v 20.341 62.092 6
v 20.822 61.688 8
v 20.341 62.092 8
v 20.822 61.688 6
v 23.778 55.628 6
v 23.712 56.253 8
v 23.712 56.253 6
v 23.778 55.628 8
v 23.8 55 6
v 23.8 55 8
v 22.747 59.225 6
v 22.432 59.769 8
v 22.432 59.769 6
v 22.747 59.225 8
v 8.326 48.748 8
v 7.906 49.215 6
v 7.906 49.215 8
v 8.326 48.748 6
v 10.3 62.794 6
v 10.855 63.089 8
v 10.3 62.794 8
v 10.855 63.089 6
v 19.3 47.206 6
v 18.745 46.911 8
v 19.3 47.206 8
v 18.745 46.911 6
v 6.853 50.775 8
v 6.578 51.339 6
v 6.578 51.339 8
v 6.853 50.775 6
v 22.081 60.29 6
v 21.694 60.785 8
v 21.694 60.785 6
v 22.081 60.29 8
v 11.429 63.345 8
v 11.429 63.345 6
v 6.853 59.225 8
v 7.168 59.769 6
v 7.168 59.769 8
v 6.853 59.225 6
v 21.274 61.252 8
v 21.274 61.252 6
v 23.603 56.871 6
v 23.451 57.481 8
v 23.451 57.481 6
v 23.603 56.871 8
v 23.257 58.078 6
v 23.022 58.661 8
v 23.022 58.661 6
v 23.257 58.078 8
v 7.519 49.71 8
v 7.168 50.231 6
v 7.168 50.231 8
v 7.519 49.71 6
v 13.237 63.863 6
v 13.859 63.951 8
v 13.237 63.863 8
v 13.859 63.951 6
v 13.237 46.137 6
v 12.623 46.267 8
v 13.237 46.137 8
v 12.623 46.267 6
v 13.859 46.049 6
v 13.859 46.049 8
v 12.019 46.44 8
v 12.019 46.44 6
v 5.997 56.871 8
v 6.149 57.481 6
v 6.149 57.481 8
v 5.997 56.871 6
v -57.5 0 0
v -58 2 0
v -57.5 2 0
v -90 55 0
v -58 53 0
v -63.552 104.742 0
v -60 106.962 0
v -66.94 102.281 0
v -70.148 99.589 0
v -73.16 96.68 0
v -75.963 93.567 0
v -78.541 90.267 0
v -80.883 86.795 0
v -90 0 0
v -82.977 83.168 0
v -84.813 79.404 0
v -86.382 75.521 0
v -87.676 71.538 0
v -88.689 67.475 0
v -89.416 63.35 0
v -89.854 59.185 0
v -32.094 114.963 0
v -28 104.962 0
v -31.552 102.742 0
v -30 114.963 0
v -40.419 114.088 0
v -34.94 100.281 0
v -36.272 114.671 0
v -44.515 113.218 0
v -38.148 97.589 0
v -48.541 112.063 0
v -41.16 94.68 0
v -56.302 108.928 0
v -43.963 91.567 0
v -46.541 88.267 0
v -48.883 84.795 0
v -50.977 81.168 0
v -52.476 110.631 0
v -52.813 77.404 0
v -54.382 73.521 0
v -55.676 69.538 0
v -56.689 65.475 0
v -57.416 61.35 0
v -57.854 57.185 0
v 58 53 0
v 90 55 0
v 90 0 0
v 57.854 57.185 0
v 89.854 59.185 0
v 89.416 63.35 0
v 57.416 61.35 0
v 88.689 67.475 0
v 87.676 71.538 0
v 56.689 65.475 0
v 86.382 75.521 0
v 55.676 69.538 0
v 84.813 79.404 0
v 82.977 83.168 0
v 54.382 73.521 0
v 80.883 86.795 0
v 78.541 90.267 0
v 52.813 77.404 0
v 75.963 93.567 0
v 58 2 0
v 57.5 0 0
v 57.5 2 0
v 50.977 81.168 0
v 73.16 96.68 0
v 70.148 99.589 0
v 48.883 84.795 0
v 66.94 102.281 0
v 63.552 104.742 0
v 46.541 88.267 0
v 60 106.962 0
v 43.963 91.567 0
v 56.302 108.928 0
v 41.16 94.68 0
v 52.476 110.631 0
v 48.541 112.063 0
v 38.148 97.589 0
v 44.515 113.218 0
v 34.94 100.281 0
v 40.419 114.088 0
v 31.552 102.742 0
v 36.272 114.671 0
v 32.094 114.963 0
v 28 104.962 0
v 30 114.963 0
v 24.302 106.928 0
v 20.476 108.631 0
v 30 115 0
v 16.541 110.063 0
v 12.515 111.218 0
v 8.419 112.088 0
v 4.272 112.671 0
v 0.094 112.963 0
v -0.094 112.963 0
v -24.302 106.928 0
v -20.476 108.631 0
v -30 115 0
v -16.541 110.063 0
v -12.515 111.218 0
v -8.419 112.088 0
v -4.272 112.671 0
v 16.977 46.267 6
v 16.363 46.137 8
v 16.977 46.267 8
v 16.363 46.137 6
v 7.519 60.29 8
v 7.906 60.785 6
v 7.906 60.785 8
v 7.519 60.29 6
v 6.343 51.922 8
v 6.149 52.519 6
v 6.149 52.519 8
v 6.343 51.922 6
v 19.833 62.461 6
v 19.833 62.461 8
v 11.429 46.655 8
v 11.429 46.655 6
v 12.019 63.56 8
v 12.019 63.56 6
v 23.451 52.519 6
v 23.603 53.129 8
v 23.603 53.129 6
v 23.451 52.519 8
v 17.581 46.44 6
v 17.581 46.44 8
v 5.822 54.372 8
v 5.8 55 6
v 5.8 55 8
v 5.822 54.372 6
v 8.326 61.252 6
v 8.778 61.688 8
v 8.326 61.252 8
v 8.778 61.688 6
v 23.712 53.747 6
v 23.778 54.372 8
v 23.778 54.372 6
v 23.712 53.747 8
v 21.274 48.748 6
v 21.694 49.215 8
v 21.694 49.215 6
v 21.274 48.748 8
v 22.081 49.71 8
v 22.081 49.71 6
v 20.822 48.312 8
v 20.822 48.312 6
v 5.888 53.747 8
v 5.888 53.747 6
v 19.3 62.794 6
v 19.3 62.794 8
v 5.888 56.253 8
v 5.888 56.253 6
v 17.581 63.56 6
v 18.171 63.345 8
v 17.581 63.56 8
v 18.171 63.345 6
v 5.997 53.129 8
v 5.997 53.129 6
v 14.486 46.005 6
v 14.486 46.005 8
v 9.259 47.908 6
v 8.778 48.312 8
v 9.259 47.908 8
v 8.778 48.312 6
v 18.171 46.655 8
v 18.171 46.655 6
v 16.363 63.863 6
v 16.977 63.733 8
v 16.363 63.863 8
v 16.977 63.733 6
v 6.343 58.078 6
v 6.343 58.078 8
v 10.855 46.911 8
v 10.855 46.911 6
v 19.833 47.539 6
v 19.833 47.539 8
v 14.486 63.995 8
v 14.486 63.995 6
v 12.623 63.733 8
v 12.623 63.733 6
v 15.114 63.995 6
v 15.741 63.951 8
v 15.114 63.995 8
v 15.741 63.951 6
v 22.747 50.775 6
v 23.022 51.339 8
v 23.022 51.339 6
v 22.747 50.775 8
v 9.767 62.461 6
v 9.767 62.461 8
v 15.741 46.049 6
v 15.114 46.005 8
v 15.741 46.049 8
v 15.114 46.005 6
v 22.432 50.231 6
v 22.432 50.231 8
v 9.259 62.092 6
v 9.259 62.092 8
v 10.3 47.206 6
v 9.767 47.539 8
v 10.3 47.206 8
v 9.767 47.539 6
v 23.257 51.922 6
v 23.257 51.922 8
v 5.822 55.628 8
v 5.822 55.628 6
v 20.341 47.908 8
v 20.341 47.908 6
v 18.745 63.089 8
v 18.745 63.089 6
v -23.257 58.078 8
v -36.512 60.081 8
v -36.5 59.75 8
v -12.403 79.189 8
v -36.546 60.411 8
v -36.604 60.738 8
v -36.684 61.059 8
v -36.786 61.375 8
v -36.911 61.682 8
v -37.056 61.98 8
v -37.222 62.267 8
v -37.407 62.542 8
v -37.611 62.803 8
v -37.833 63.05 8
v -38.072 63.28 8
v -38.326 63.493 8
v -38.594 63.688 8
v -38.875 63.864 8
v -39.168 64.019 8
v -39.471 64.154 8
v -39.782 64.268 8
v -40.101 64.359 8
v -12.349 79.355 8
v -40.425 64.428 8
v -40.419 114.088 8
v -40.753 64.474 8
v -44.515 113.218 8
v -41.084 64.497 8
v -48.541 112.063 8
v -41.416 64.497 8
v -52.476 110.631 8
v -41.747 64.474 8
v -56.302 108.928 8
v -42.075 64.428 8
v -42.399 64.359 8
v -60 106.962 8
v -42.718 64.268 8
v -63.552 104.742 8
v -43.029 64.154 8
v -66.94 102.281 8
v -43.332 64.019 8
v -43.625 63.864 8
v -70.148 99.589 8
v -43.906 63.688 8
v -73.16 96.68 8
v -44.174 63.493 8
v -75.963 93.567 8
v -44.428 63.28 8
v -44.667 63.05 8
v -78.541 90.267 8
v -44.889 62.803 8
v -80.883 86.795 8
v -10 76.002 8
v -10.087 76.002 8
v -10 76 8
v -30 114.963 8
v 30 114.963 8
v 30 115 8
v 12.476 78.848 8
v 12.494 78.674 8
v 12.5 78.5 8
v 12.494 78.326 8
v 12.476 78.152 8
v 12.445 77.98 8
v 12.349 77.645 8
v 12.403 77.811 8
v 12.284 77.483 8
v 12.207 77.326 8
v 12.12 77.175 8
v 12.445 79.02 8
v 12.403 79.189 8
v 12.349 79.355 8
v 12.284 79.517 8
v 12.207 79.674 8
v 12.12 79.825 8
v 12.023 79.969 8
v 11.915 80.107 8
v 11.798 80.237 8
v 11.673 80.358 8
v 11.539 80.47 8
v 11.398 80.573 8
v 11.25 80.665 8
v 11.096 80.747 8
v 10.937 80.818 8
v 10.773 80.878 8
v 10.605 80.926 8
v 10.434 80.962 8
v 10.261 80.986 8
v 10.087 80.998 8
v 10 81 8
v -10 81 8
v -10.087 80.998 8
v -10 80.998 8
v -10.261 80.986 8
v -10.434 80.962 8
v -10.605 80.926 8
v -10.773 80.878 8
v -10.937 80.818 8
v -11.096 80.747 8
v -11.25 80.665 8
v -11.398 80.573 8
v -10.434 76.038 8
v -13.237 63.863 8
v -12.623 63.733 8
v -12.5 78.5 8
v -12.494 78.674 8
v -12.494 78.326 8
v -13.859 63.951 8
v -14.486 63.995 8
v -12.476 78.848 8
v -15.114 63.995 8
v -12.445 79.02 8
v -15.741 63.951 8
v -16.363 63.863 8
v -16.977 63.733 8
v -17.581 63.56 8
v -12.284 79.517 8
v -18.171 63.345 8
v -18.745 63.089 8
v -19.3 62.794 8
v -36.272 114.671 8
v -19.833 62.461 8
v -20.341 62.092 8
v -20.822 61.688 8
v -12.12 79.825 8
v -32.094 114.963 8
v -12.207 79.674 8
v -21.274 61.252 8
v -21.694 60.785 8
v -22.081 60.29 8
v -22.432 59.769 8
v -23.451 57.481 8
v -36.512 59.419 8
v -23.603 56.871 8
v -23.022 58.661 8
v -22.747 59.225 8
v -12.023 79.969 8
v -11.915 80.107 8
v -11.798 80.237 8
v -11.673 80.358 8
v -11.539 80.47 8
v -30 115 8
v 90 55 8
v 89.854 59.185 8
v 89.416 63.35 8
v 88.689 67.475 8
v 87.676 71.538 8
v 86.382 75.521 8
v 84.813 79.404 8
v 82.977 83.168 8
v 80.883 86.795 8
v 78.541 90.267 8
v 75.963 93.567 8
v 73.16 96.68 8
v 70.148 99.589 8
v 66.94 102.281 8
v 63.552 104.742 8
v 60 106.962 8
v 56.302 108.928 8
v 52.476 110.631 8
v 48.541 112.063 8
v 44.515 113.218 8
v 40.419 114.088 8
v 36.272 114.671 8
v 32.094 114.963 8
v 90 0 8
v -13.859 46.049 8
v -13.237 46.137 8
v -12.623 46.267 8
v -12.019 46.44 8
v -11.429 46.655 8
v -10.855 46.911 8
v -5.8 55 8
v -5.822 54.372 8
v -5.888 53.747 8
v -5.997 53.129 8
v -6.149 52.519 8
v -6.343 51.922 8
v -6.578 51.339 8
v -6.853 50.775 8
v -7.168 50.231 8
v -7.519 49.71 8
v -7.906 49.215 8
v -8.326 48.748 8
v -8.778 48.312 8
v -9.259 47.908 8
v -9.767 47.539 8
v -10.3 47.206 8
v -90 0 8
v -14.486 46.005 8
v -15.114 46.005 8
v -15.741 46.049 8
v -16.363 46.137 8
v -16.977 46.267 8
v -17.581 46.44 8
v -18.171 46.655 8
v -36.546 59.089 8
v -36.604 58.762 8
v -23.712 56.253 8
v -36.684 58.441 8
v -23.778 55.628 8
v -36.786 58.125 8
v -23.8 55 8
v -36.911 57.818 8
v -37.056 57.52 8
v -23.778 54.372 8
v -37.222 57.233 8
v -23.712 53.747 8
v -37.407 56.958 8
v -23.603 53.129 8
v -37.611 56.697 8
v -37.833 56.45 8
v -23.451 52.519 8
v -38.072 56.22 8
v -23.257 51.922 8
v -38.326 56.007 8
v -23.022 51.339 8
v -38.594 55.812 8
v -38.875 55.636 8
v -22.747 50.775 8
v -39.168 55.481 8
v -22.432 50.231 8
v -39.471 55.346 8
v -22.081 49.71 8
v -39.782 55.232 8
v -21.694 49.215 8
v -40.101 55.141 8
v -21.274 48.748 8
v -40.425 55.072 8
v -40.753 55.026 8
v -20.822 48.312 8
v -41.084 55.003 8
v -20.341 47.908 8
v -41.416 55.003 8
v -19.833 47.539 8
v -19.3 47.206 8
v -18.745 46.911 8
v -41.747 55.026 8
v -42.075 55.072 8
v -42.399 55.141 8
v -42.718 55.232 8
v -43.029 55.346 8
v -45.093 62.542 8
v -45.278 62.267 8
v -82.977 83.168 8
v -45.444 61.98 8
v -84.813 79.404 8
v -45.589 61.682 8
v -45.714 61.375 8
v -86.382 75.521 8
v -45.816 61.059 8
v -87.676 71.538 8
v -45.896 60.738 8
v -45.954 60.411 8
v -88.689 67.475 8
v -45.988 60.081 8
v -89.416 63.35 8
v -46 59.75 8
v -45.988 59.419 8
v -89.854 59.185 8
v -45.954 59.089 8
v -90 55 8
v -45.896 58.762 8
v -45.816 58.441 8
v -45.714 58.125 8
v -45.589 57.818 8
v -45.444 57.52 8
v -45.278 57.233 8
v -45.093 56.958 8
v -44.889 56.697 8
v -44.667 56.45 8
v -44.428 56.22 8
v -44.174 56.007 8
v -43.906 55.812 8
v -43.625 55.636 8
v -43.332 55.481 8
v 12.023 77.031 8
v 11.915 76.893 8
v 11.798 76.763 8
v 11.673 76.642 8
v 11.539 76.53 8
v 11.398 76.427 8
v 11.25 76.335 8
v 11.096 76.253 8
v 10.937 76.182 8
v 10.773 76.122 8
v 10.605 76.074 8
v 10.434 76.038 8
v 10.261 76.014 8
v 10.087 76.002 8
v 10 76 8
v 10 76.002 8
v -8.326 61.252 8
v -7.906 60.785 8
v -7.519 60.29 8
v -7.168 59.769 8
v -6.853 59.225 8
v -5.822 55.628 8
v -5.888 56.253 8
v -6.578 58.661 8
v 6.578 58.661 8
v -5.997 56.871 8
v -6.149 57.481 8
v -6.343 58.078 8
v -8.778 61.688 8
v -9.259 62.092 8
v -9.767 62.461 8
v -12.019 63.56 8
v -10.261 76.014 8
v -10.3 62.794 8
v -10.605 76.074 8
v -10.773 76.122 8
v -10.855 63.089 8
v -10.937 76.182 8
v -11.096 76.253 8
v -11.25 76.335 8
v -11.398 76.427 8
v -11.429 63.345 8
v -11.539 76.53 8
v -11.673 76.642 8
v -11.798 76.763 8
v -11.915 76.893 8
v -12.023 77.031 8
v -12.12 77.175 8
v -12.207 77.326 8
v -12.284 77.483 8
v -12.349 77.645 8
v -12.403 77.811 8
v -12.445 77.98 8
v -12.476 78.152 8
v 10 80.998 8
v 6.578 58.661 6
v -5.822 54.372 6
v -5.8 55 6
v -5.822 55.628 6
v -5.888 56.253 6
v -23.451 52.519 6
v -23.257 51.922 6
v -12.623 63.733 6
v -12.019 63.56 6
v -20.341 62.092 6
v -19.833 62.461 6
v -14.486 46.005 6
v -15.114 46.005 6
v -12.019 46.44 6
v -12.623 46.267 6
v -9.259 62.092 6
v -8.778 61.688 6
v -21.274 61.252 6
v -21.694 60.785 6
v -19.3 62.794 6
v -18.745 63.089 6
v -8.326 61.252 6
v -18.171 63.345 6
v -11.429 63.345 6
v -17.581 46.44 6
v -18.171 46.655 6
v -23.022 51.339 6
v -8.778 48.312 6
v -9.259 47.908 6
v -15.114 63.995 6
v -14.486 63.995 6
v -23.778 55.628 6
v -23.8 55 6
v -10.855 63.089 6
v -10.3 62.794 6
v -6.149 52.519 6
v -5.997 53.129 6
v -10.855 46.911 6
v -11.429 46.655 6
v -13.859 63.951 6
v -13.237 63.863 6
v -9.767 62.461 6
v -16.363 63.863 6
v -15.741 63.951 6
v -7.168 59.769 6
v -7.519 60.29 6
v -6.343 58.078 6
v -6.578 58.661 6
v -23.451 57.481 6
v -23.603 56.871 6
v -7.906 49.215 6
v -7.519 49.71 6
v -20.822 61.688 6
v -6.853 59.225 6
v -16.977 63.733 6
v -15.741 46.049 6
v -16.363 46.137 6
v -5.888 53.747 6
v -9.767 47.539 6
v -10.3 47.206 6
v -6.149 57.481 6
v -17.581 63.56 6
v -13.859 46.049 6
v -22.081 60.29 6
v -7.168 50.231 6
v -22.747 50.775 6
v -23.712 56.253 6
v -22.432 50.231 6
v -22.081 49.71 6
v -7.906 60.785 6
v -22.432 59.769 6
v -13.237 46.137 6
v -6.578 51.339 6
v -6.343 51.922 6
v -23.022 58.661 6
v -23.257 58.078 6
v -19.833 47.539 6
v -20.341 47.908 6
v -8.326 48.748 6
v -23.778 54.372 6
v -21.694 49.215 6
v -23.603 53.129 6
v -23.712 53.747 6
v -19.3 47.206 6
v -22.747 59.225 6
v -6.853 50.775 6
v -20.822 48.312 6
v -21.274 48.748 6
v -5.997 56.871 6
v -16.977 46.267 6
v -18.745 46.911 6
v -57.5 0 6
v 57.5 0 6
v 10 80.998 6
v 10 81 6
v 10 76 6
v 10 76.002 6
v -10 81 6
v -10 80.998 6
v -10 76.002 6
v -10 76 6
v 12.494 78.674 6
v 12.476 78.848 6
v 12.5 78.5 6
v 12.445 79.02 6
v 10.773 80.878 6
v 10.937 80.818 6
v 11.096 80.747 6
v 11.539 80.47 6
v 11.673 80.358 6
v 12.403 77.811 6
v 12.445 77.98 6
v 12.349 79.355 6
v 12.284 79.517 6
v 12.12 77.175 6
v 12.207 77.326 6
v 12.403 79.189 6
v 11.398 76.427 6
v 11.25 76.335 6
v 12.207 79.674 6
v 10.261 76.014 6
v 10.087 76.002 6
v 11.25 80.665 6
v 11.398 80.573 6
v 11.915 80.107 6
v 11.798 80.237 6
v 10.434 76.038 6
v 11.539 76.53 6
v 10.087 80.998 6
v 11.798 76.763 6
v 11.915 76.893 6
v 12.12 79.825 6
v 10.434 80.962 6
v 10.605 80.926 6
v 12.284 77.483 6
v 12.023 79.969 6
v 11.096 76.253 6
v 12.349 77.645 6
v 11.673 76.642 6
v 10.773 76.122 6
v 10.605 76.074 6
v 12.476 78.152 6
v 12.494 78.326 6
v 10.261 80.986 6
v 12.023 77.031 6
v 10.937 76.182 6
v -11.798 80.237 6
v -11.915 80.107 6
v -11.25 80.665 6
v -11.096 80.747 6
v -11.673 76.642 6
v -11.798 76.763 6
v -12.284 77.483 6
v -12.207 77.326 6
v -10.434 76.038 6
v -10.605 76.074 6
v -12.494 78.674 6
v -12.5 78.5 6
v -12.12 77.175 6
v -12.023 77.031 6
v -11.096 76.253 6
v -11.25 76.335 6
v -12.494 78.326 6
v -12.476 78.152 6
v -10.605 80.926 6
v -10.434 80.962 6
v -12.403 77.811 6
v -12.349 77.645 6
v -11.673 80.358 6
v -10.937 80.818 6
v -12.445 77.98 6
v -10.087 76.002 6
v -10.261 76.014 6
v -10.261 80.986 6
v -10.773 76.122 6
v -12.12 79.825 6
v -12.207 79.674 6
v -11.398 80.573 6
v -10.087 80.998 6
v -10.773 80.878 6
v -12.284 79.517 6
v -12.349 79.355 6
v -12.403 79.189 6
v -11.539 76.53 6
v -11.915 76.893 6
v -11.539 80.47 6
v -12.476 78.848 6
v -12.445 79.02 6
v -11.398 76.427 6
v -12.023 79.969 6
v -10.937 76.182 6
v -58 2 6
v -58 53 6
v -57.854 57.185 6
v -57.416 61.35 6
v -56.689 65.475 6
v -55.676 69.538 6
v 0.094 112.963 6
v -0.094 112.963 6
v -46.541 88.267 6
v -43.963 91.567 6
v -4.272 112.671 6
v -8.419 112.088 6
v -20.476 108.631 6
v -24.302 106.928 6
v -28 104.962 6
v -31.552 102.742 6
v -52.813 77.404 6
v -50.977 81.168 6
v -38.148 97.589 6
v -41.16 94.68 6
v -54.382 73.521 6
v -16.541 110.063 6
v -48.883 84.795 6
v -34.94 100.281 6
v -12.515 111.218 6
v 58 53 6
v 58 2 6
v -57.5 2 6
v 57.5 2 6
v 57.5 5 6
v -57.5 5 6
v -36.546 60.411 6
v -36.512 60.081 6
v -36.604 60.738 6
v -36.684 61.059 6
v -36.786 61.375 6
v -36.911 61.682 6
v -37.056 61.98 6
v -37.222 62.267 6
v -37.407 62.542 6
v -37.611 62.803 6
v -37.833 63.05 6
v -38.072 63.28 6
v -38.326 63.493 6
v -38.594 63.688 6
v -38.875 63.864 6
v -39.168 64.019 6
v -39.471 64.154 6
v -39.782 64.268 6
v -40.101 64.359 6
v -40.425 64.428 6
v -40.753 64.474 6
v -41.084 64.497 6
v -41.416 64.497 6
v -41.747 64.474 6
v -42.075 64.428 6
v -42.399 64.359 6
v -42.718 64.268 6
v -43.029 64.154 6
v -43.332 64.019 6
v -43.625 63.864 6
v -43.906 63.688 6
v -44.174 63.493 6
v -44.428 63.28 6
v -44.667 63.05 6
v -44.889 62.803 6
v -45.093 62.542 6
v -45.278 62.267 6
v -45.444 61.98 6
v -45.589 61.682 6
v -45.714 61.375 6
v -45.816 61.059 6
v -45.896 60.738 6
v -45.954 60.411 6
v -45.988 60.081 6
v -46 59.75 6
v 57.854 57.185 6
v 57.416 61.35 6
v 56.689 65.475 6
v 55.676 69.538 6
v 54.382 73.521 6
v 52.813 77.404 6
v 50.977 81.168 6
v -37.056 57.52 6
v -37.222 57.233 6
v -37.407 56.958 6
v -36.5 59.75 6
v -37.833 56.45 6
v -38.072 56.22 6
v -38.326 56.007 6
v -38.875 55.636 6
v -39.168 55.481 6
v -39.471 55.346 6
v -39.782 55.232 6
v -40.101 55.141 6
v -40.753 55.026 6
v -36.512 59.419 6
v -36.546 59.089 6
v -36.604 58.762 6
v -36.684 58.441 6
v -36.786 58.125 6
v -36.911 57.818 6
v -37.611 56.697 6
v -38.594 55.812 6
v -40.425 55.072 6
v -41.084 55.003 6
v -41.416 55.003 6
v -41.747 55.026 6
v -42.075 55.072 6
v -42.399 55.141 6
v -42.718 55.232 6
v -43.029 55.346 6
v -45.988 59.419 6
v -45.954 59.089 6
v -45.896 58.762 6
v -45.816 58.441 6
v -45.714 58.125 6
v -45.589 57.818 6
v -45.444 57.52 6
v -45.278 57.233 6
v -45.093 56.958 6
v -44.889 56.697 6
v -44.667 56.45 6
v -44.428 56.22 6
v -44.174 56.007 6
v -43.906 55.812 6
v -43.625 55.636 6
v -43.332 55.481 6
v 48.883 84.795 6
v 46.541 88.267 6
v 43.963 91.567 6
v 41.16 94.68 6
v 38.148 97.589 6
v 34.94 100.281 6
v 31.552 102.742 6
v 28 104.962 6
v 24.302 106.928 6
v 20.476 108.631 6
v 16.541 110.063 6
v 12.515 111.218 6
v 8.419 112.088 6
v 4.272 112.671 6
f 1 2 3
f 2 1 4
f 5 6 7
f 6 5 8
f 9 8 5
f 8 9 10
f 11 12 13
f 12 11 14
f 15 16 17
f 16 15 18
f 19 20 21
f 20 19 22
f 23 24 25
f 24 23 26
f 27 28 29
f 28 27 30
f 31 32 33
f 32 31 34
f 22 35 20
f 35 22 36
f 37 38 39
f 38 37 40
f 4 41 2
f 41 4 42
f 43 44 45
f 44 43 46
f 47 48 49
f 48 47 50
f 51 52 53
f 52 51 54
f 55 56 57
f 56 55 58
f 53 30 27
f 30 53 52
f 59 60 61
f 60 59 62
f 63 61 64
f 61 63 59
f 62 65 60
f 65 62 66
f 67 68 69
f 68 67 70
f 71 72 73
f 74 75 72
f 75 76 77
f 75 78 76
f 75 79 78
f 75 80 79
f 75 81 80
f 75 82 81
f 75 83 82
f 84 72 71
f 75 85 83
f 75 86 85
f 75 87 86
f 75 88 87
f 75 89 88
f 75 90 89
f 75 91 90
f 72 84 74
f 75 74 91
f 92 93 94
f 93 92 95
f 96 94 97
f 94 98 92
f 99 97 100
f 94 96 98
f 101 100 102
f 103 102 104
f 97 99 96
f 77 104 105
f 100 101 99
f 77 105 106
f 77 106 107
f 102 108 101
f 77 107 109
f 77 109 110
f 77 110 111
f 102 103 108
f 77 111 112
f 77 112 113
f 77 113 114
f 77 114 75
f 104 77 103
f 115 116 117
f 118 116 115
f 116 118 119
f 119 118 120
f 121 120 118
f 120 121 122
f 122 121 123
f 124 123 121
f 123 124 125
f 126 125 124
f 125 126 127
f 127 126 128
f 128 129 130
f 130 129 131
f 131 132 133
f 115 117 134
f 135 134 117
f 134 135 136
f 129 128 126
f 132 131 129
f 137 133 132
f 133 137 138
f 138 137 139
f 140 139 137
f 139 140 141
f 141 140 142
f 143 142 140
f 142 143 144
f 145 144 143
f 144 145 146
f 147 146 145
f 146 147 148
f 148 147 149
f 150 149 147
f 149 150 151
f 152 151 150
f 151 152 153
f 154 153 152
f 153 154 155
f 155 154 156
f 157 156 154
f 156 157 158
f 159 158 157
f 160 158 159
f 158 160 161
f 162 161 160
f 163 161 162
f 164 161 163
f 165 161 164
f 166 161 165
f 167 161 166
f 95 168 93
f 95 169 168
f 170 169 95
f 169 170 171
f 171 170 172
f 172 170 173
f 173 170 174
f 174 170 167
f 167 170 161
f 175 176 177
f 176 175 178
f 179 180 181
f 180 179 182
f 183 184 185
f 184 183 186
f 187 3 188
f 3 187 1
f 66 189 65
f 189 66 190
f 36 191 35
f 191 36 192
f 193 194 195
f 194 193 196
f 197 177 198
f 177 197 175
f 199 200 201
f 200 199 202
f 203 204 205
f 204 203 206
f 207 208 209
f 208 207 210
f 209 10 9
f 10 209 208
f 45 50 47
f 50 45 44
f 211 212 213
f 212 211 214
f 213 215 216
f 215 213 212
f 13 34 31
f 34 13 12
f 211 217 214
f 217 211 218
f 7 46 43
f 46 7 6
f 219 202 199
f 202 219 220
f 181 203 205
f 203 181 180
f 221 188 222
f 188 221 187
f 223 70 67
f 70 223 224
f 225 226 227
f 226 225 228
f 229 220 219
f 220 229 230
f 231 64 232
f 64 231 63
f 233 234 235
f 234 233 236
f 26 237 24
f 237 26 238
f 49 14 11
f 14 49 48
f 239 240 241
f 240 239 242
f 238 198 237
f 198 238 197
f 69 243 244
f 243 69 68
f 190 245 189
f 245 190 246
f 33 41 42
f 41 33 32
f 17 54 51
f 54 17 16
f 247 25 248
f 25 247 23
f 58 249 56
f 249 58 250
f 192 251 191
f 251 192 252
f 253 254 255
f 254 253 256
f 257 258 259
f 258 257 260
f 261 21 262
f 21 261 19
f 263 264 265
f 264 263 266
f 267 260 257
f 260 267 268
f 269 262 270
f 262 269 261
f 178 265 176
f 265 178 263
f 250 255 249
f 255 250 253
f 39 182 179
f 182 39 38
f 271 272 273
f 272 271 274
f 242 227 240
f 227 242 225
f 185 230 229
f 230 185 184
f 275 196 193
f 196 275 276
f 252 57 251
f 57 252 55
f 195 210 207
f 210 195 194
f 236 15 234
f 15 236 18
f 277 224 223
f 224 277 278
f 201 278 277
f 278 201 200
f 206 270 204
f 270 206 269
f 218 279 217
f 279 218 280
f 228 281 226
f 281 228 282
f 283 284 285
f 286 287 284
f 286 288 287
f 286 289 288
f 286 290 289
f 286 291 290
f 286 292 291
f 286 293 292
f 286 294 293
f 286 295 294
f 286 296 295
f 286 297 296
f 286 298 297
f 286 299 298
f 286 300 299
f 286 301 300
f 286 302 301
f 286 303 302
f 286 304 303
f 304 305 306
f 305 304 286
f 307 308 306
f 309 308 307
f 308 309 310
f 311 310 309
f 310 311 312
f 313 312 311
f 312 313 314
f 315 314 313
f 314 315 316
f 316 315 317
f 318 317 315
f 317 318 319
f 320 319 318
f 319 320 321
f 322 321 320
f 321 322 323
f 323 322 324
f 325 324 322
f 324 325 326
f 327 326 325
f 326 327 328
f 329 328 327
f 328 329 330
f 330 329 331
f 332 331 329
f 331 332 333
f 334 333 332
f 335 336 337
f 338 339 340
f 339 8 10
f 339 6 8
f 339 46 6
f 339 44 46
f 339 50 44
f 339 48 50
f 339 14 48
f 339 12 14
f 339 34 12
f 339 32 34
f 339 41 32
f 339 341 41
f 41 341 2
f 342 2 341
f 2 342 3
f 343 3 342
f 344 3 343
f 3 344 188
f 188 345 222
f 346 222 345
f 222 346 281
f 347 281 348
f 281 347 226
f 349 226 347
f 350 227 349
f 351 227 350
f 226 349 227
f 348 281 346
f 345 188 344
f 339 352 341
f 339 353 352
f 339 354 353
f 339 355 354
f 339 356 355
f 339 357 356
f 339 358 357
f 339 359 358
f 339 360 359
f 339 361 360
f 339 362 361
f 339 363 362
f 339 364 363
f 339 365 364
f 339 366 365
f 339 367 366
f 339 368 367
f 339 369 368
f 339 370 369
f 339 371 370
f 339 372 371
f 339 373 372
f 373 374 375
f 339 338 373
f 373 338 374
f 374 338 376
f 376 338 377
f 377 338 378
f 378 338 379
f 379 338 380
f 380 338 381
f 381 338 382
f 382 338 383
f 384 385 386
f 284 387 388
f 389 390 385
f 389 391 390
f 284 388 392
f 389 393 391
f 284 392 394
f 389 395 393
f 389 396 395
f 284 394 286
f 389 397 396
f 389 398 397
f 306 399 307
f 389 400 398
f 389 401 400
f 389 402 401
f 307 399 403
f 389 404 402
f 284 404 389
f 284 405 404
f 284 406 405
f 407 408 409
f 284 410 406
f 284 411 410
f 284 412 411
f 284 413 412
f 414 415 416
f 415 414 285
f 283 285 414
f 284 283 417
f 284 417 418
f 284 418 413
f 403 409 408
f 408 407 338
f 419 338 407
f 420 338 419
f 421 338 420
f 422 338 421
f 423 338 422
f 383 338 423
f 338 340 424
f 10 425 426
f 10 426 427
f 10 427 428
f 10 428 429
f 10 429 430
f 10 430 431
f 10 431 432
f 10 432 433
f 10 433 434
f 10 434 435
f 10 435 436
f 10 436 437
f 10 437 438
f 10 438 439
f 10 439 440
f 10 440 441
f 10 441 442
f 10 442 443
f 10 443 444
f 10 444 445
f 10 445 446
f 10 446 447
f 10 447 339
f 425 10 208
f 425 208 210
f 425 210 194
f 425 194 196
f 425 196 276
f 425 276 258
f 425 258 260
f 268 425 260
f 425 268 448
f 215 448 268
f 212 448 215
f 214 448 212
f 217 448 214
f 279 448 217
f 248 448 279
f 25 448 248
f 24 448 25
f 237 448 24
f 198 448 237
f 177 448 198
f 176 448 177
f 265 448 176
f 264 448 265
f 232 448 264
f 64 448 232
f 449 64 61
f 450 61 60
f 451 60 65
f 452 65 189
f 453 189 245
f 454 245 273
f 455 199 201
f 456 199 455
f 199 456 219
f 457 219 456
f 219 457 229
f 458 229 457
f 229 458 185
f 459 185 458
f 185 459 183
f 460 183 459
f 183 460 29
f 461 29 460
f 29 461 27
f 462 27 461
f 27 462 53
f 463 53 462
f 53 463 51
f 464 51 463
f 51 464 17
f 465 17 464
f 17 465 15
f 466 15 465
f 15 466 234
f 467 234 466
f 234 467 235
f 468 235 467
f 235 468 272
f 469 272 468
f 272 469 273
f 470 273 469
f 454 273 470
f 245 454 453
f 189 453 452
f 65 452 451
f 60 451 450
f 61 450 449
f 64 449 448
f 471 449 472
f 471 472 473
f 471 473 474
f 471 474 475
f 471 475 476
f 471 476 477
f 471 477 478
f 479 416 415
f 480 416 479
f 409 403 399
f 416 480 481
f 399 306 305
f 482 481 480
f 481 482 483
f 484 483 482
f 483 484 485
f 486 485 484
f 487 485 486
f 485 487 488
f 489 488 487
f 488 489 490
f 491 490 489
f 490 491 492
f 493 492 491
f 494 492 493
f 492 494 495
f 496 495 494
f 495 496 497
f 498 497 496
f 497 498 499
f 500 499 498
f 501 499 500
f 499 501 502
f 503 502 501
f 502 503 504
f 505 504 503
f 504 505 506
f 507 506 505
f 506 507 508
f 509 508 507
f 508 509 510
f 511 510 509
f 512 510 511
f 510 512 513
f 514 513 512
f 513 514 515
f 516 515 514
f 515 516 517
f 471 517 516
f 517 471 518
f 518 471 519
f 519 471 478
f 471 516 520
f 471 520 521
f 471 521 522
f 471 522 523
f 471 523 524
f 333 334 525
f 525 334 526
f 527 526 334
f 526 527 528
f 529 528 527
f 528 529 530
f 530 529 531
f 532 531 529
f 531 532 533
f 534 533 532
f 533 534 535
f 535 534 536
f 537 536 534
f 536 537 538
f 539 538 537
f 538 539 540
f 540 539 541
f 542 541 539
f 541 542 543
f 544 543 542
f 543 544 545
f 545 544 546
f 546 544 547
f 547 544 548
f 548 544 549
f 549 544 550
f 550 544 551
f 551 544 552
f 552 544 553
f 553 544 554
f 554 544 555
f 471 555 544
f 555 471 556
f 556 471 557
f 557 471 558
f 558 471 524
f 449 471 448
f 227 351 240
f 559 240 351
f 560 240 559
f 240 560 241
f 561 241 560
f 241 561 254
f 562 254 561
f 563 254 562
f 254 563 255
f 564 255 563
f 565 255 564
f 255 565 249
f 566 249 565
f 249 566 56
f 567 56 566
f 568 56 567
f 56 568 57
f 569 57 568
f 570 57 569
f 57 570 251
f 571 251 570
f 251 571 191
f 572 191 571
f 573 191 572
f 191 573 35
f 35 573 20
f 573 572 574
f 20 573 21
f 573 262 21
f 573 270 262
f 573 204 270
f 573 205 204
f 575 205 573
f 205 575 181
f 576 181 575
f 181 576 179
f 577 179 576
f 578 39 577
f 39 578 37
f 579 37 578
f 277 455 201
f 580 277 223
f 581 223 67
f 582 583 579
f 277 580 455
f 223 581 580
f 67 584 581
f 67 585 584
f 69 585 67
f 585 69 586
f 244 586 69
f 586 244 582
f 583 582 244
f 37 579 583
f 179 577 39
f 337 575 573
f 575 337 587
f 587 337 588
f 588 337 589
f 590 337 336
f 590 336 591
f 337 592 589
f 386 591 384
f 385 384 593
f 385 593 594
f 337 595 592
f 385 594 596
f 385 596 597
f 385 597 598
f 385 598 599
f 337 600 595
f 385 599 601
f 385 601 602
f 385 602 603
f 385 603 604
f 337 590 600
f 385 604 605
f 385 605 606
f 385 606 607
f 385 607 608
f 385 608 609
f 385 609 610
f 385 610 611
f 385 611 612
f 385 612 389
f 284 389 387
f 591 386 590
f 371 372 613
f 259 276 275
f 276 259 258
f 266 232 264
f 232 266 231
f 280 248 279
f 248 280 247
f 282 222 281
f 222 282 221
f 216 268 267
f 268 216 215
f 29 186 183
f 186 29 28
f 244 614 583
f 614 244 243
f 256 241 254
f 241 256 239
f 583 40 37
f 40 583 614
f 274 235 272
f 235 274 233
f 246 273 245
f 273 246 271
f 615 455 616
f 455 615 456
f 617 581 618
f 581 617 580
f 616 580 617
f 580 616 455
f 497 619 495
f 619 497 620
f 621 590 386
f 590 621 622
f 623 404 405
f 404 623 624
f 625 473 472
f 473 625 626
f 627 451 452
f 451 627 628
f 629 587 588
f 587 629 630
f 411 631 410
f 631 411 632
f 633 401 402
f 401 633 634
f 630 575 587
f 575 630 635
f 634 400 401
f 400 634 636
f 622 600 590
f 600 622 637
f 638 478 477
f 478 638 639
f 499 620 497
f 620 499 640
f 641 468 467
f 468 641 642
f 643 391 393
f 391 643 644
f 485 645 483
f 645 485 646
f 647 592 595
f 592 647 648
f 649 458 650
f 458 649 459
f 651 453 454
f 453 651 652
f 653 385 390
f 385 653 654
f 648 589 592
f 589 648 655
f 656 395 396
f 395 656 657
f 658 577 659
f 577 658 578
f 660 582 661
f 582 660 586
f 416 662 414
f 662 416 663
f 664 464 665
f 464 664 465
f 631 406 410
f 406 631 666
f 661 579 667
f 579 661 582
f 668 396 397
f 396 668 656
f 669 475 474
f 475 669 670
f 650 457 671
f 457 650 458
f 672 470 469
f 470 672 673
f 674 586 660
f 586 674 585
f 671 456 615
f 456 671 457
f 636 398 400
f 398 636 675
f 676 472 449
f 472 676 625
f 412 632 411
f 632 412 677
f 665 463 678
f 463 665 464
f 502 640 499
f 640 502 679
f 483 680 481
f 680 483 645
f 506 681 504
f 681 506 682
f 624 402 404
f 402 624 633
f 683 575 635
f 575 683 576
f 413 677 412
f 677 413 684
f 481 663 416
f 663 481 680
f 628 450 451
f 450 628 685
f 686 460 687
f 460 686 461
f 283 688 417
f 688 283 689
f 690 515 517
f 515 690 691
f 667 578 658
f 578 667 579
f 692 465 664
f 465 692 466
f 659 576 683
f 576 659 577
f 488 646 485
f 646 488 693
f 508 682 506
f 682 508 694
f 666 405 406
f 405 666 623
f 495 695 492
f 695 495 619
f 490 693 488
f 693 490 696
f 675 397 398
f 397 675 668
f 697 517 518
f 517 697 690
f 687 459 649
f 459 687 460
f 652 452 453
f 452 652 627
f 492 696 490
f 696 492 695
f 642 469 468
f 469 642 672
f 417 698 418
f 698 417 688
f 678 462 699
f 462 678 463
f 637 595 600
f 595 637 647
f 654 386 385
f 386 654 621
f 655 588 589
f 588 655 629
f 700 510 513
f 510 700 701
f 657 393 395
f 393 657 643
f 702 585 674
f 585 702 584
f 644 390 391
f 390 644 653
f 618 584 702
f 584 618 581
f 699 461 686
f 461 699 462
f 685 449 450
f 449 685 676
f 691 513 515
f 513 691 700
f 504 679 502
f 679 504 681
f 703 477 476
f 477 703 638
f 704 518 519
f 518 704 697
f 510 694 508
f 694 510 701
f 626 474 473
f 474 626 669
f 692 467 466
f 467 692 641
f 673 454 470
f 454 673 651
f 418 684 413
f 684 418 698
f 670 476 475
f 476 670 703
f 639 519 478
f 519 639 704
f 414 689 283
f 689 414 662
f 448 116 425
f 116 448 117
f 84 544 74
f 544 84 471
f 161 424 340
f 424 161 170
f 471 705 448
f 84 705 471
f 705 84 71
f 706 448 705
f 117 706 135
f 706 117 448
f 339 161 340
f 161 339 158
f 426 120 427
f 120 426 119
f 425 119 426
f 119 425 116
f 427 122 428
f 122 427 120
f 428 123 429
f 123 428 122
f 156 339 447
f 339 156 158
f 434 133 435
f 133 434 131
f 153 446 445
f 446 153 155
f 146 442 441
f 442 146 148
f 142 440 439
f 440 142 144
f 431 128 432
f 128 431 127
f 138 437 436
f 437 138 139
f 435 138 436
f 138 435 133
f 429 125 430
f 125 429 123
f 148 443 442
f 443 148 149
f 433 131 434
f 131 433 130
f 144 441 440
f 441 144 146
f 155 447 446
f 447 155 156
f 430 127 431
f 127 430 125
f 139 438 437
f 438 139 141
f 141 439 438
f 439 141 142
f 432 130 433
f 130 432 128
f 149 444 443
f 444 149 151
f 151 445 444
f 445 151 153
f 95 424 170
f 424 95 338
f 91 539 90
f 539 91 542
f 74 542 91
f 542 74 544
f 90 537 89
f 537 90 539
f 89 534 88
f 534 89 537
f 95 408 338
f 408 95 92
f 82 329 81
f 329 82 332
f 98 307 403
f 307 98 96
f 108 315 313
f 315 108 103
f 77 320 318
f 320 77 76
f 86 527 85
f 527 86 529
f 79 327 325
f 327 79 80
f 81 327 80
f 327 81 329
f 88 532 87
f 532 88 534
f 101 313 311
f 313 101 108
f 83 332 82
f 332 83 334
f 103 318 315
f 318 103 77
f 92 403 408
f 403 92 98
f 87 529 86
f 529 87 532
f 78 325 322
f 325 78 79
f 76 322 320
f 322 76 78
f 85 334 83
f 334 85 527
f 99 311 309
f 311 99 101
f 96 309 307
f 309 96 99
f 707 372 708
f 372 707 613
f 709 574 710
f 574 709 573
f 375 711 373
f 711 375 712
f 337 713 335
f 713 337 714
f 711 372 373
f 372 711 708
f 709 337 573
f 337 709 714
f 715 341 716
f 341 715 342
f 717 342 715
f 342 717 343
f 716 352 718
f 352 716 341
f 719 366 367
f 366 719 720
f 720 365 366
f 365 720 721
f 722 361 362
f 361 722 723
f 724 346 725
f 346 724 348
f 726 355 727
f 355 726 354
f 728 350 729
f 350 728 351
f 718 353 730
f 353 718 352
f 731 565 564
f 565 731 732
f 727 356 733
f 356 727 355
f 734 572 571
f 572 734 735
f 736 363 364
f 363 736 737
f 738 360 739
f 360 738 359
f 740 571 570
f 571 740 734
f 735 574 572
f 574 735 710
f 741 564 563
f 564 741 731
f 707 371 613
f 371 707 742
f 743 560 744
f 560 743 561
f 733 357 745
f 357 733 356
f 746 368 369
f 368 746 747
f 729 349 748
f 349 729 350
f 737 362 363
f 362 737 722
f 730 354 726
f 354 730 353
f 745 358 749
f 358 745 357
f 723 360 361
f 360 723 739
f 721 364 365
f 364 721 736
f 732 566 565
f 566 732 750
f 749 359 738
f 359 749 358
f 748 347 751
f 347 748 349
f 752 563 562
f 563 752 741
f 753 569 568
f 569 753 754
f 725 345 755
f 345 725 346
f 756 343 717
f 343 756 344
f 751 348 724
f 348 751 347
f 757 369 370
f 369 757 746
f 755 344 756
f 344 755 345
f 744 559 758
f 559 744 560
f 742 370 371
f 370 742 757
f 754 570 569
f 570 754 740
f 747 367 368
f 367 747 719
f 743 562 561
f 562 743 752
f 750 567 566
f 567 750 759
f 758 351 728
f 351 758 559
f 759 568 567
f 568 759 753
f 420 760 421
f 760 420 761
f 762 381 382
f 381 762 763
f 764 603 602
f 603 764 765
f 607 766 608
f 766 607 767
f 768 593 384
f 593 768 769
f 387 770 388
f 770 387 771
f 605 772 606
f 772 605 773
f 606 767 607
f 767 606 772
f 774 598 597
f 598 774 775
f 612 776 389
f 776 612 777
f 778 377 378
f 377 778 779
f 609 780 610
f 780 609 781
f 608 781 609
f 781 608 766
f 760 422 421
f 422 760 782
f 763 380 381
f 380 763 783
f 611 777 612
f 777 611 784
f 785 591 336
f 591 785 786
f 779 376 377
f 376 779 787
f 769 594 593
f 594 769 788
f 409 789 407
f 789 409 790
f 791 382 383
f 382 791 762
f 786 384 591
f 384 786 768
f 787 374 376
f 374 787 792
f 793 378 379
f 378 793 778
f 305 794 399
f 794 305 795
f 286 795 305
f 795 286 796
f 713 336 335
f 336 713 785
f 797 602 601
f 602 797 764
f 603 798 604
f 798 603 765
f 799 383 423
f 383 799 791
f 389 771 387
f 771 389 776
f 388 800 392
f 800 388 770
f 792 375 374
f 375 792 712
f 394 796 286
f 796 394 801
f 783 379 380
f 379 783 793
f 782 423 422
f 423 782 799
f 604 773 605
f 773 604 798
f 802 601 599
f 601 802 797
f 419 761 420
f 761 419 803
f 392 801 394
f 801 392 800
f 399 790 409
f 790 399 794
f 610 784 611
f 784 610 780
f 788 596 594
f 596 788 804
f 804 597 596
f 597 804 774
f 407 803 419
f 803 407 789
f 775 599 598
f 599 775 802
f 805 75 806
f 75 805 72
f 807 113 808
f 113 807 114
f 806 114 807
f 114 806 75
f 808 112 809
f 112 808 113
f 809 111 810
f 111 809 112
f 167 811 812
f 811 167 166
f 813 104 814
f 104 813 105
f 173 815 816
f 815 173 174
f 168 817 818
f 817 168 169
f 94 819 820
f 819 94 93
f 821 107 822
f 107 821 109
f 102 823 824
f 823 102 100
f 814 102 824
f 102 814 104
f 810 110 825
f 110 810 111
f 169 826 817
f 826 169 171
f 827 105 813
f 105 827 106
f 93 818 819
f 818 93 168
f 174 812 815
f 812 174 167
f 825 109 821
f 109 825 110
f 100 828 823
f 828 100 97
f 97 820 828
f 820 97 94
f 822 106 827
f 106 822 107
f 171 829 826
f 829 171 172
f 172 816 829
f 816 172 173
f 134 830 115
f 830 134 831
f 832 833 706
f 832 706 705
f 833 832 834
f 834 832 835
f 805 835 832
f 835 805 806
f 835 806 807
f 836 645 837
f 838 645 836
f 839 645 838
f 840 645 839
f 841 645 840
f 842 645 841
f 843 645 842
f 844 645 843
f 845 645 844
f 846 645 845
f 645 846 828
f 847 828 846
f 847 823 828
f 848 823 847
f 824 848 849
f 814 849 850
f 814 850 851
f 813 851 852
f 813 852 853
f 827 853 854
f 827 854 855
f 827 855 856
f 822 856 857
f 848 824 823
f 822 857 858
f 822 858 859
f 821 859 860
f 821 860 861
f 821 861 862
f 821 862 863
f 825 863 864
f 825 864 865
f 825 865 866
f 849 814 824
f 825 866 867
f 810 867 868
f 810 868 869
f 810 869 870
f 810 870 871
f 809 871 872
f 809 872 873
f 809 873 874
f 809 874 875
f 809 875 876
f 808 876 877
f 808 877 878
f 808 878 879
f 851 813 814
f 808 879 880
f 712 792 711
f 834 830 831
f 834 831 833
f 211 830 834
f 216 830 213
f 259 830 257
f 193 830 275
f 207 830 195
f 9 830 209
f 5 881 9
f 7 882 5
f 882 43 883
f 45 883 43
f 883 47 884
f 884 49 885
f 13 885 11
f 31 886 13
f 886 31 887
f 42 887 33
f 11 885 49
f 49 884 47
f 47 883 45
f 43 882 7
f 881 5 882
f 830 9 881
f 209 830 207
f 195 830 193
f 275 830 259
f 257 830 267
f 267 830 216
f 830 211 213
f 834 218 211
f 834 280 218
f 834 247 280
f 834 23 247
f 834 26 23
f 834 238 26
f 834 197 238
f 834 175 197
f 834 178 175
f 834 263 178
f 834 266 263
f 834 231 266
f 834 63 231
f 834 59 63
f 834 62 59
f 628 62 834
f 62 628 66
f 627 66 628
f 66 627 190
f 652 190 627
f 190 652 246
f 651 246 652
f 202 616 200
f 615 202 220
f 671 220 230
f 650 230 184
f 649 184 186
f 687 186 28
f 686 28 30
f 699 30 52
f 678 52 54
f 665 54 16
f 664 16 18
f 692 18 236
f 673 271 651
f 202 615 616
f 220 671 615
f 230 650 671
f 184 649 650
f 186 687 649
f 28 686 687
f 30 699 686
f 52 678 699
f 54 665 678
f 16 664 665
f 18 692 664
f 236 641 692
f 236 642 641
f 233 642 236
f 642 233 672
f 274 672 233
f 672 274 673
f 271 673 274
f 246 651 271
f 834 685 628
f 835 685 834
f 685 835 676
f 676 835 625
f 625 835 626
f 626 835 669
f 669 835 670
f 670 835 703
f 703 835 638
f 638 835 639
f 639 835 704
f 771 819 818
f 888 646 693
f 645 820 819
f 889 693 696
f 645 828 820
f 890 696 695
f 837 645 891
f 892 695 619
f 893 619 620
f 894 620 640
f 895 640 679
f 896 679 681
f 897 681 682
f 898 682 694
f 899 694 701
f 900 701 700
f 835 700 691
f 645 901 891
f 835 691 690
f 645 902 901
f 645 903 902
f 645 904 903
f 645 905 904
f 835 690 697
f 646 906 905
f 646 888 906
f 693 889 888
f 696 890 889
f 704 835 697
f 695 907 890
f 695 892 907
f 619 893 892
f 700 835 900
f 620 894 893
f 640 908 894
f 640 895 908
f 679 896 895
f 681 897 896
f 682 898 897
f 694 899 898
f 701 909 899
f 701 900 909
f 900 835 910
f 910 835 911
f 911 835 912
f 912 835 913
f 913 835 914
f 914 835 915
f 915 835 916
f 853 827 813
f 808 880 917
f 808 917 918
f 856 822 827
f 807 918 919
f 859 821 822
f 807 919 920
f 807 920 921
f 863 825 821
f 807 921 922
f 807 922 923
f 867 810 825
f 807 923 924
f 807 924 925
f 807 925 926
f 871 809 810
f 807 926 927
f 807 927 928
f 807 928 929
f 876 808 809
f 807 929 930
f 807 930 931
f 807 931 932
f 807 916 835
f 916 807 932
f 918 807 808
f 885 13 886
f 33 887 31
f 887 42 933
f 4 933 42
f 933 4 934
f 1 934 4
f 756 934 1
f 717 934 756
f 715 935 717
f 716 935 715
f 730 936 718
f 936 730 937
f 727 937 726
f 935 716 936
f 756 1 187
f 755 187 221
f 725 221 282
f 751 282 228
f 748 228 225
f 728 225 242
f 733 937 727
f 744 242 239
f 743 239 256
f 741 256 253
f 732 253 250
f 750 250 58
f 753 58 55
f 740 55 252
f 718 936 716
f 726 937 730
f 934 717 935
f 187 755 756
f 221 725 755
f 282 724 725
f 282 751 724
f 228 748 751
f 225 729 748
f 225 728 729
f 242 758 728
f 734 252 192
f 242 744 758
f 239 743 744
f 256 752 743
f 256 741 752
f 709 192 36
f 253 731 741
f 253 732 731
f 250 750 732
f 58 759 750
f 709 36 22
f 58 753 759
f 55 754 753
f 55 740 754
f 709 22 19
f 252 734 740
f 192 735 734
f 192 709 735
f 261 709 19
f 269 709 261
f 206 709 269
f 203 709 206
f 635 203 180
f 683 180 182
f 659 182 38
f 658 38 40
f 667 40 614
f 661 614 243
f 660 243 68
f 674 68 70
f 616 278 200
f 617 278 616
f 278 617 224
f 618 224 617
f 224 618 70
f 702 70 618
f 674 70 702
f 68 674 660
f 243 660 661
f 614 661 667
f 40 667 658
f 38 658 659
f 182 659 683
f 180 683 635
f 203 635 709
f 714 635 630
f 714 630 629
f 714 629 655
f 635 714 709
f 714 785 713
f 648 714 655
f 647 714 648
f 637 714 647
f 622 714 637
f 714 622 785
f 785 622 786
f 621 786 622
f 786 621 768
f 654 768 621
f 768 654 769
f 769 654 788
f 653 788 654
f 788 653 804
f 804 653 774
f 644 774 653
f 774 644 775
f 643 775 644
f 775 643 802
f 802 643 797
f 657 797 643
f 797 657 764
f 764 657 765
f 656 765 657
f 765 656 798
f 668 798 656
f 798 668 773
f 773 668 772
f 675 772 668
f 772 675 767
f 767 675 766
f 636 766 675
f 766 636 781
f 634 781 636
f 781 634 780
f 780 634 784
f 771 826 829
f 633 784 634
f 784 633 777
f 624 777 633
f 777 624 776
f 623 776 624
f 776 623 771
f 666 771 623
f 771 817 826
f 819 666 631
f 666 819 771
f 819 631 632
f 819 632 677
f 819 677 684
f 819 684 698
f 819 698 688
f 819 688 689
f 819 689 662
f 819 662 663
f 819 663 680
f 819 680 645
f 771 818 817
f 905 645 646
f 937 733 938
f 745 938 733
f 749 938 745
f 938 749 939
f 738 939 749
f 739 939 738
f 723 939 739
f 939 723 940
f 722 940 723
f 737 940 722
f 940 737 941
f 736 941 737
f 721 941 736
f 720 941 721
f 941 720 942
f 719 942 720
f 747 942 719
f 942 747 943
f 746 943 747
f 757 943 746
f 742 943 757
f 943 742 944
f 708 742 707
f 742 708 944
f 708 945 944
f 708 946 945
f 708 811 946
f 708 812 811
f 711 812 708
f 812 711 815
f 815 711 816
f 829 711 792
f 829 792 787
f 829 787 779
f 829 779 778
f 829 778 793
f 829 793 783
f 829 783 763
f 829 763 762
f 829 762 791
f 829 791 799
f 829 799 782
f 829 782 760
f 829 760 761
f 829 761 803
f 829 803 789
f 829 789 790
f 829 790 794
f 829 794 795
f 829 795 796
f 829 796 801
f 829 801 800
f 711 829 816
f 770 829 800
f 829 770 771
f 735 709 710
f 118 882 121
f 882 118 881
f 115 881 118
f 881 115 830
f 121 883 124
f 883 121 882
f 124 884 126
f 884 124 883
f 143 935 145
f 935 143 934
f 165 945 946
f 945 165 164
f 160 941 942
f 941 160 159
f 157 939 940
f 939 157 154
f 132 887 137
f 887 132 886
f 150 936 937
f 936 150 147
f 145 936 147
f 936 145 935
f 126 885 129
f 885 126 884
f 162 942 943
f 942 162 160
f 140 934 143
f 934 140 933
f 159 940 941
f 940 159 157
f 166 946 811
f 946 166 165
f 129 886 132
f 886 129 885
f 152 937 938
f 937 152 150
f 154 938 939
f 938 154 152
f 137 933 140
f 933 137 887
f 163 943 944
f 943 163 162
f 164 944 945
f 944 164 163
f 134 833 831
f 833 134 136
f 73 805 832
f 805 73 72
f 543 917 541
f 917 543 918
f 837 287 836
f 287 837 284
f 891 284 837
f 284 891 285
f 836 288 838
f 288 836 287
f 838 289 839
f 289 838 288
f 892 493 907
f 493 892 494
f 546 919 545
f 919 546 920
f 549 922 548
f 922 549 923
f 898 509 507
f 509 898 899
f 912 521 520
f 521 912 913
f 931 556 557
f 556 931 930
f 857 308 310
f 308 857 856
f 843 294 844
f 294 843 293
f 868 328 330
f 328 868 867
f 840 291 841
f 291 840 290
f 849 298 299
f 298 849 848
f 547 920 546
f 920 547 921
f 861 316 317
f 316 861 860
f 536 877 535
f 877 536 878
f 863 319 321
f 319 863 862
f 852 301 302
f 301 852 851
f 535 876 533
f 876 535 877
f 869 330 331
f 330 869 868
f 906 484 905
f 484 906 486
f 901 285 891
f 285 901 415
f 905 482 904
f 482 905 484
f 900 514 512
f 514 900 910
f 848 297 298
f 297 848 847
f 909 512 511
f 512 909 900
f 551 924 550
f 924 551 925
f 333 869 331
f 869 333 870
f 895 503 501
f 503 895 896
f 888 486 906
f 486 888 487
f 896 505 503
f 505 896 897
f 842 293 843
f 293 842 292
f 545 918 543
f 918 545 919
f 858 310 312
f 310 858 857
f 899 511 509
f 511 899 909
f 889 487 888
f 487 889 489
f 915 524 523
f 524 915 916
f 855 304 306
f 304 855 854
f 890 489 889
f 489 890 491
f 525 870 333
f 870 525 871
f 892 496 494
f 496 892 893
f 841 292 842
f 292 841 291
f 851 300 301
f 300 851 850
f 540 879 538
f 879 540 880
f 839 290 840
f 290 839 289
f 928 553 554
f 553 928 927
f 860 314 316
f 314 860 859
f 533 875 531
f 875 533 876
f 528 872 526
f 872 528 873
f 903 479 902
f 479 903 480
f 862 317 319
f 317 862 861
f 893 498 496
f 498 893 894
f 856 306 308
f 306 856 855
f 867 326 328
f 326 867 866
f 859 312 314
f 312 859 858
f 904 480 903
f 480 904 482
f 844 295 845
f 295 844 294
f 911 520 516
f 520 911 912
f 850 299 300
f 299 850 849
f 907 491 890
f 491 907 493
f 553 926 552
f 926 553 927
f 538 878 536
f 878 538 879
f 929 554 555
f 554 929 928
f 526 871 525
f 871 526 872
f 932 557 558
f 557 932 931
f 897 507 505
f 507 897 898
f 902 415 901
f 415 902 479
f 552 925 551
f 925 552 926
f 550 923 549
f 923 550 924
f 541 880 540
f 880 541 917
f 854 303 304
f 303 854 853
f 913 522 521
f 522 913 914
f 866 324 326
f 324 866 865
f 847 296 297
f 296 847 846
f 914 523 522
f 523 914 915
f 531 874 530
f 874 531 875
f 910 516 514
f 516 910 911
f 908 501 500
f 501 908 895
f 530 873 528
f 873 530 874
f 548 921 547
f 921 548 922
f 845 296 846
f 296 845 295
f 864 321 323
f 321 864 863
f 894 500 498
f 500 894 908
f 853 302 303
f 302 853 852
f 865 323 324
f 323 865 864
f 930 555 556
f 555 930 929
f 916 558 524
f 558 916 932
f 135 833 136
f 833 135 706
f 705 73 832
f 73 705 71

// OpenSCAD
$fn=90;

module espresso(length, width, thickness){
    holedist = 55;
difference(){
    translate([0,width/2,thickness/2])
    cube([length, width, thickness], center=true);
            union(){
            translate([14.8,holedist,0])
                cylinder(r=9, h=thickness);
            translate([-14.8,holedist,0]) 
                cylinder(r=9, h=thickness);
            }
    }
}
module edge(size,thickness,x,y){
    translate([-size,-size,0]){
    translate([x,y,0]){
        difference(){
            cube([size,size,thickness]);
            cylinder(r= size,h= thickness);
        }
    }
  }
}


module espressoplatte(length, width, thickness){
difference(){
espresso(length, width, thickness);
    union(){
    mirror() edge(60,8,length/2,width);
    edge(60,8,length/2,width);
    }
}
}

module cut(hi, wi, ti){
    union(){
    translate([0, wi/2, ti/2])
        cube([hi, wi, ti],center=true);
    translate([hi/2,wi/2,0])
        cylinder(r=wi/2,h=ti);
    translate([-hi/2,wi/2,0])
        cylinder(r=wi/2,h=ti);
    }
}

module cut2(hi,wi,ti,shrink){
    difference(){
        translate([0,wi/2,ti/2])
            cube([hi-shrink*2,wi-shrink*2,ti],center=true);
        
        union(){
            translate([-hi/2,0,ti-shrink])
                cube([hi,wi,shrink]);
            mirror() edge(60,8,hi/2-shrink,wi-shrink);
            edge(60,ti-shrink,hi/2-shrink,wi-shrink);
        }
    }
}




length  = 180;
width   = 115;
thickness= 8;
wall=2;

difference(){
espressoplatte(length, width, thickness);
    union(){
        translate([0,76,0])
            cut(20, 5,thickness); //passt
        translate([-41.25,59.75,0])
            cylinder(r=4.75,h=thickness);
        cut2(120,115,thickness,wall);
        translate([0,2.5,3])
            cube([115,5,6],center=true);
    }
}
